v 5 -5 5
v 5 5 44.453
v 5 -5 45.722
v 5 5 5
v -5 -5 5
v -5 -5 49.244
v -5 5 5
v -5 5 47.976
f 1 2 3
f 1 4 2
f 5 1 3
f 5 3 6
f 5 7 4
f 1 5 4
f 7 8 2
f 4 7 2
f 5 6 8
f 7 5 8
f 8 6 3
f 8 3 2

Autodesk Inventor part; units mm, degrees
ref_plane "Start Plane" through (0, 0, 5) normal (0, 0, 1) x (1, 0, 0)
ref_plane "End Plane" through (0, 0, 49.2474) normal (0, 0, 1) x (1, 0, 0)
sketch "Sketch" plane through (0, 0, 0) normal (0, 0, 1) x (1, 0, 0)
  line L0 (5, -5) -> (-5, -5)
  line L1 (-5, -5) -> (-5, 5)
  line L2 (-5, 5) -> (5, 5)
  line L3 (5, 5) -> (5, -5)
  line L4 (-6, 0) -> (8, 0) construction
  line L5 (0, -30) -> (0, 40) construction
  line L6 (0, 54) -> (0, -44) construction
  line L7 (-9.2, 0) -> (13.2, 0) construction
  dimension "d0" = 10
  dimension "d1" = 10
  dimension "d4" = 5
  dimension "d5" = 5
extrude "Body" add sketch "Sketch" along normal up to surface (44.2474 mm away) from surface at 5
sketch "Sketch3" plane through (0, 0, 0) normal (0, 0, 1) x (1, 0, 0)
  line L0 (0, 0) -> (10, 0)
ref_plane "Work Plane3" through (0, 0, 0) normal (0, -1, 0) x (1, 0, 0)
sketch "Sketch4" plane through (0, 0, 0) normal (0, -1, 0) x (1, 0, 0)
  line L0 (-2, 5) -> (12, 5)
  line L1 (-2, 49.2474) -> (12, 49.2474)
  dimension "d9" = 44.2474
ref_plane "Work Plane4" through (-5.9225, -101.2995, 61.7854) normal (0.3299, 0.1188, 0.9365) x (0.9438, -0.0202, -0.3299)
split "Split1" plane through (-5.9225, -101.2995, 61.7854) removes the side toward (0.3299, 0.1188, 0.9365)
ref_plane "Work Plane5" through (-24.7397, 52.8201, 5) normal (0, 0, -1) x (-1, 0, 0)
split "Split2" plane through (-24.7397, 52.8201, 5) removes the side toward (0, 0, -1)
equation "\"d0\" = G_W"
equation "\"d1\" = G_H"
equation "\"d4\" = 0.5 * d1"
equation "\"d5\" = 0.5 * d0"
equation "\"d2\" = G_L"
equation "\"G_W\" = 10"
equation "\"G_H\" = 10"
equation "\"G_L\" = d9"
equation "\"G_OFFSET_START\" = -5"
equation "\"G_OFFSET_END\" = -8.2824"
equation "\"d6\" = -G_OFFSET_START"
equation "\"d7\" = G_OFFSET_END + B_L"
equation "\"B_L\" = 57.52978"
properties part number "ISO 1035/2 - 10 x 10 - 44.25" material "Steel, Mild"
